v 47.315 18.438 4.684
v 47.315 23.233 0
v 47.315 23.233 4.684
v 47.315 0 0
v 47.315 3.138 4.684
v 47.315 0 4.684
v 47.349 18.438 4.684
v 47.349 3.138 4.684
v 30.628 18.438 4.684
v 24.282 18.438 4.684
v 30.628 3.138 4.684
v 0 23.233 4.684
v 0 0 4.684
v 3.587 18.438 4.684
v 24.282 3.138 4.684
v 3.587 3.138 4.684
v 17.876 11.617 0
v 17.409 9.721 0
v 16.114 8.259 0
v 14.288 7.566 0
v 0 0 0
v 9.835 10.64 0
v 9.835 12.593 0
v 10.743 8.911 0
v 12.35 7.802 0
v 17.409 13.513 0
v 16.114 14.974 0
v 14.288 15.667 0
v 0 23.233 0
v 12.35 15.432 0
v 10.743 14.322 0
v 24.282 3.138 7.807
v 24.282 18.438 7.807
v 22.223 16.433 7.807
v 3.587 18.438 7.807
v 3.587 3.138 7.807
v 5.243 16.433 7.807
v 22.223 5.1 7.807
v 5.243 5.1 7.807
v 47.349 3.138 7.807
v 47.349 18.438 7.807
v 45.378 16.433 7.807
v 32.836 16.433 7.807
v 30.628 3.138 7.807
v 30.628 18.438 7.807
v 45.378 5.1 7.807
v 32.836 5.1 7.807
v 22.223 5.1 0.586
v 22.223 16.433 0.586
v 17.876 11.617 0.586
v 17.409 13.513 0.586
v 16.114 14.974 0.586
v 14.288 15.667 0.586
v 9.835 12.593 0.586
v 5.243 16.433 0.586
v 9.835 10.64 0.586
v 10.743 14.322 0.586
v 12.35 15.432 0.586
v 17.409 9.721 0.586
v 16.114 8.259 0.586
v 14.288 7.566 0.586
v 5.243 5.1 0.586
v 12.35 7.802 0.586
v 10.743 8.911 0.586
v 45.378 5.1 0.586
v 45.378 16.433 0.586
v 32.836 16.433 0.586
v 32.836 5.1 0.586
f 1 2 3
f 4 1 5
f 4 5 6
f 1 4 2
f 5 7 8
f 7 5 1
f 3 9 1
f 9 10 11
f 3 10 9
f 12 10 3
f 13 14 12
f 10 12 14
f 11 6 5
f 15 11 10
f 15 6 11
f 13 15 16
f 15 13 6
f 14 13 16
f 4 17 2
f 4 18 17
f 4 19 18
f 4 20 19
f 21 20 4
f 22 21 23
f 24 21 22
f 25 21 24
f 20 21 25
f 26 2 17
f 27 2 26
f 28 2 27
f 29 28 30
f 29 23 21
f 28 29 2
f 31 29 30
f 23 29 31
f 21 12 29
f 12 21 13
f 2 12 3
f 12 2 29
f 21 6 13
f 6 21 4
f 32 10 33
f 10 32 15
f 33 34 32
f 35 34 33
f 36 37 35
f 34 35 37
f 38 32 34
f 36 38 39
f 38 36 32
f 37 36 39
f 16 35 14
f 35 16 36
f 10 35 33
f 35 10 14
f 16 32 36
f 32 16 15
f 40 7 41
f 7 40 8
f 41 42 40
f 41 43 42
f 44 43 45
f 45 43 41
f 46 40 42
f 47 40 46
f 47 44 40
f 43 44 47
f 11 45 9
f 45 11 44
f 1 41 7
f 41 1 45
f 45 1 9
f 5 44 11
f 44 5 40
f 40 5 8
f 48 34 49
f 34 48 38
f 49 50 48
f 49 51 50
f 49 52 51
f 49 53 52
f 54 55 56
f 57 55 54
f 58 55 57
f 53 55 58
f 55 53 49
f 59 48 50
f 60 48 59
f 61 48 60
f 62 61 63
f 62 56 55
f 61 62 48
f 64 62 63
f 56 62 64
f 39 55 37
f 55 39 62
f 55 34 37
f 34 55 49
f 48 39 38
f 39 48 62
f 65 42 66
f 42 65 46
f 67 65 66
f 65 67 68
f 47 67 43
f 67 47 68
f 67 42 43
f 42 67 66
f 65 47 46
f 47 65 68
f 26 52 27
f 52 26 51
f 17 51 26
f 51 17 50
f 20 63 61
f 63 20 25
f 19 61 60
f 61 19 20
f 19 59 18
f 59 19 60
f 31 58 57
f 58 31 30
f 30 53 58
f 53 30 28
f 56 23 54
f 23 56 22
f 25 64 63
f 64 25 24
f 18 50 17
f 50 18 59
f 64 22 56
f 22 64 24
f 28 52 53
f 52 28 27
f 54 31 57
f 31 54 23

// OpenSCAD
coldiameter = 17;
mod = coldiameter;
cpo = mod/10; // capitol offset
ch = mod*5* 1.24;
colid = 10.25;  			   		 //inner (open) diameter of column
colih = mod/3;				  	 // height of boss for column
//length = ch * .618;  			// for golden rectangle
n_o_c = 6;										//number of columns across front of temple
length = ((ch*1.618)*1.618)/(n_o_c-1); 	//comment either this or the other def out before compiiing
echo ("Length",length);									//if used, front of temple is golden rectangle
height = ch/15;
width = (mod + (cpo*2))* 1.0;  		//allows over or under hang if desired
angle = 1;

echo("Width=",width);

f_overhang = 2;			  //frieze overhang
f_height = height*2;		  //frieze height
f_d = .03; 					// amount of triglyph inset

c_overhang = mod/6;			  //cornice overhang
c_height = height *2/3;		  //cornice height
c_length = length;


//beam();
//corner();

//frieze_beam(2); 		  // parmeter is number of trigliphs
//frieze_corner();

//rotate([180,0,0]) translate([0,-18,-f_height-c_height]) {cornice_beam();}

cornice_beam(2);			//parameter is type, short or long
//cornice_beam(0);
//cornice_corner();

//qr(20,-1);					//makes a quarter round beam, if second parameter is 1, rounds one end, -1 other end
//tri();
//peg();

//abacus();
//multi_abacus();


module cornice_corner() {

}

module cornice_beam(type) {
	difference() {
		union() {
			if ( type == 0 ) {
				cube([length,width+c_overhang,c_height]);										//full sized
				translate([length*.065,width/6.5,c_height])										//full inset
					cube([length/2-(length*.125),width-(width*.25),c_height/1.5]);
				}
			if ( type == 1 ) {
				cube([length+mod/4+c_overhang,width+c_overhang,c_height]);				//for long corner
				translate([length*.065,width/6.5+c_overhang/2,c_height])						//full inset
					cube([length/2-(length*.125),width-(width*.25),c_height/1.5]);
				//echo(length+mod/4+c_overhang);	
				}	
			if ( type == 2 ) {
				cube([length-mod/2.16,width+c_overhang,c_height]);							//for short corner
				translate([length*.065,width/6.5,c_height])										//full inset
					cube([length/2-(length*.125),width-(width*.25),c_height/1.5]);
				echo("len",length-mod/2.16);	
				}	

				if (type == 0 ) {
				translate([length/2 + (length*.065),width/6.5,c_height])							//full inset
					cube([length/2-(length*.125),width-(width*.25),c_height/1.5]);
				}
				if (type == 1 ){
				translate([length/2 + (length*.055),width/6.5+c_overhang/2,c_height])		//long inset middle
					cube([length/2-(length*.354),width-(width*.25),c_height/1.5]);
				translate([length-mod/1.35,width/6.5+c_overhang/2,c_height])				//long inset end
					cube([length/4,width-(width*.25),c_height/1.5]);
				}
				if (type == 2 ){
				translate([length/2 + (length*.055),width/6.5,c_height])		//short inset middle
					cube([length/2-(length*.197),width-(width*.25),c_height/1.5]);
				}
			}
	
	translate([length/4,width/2+c_overhang/2,0]) cylinder(h=c_height,r=width/5);
	
	if (type == 0 ) {
		translate([(length*.095),width/4,c_height/8]) cube([length/3.25,width/1.8,c_height*2]);
		translate([length/2+(length*.095),width/4,c_height/8]) cube([length/3.25,width/1.8,c_height*2]);
		translate([length*.75,width/2+c_overhang/2,0]) cylinder(h=c_height,r=width/5);
		}
	if (type == 1 ) {
		translate([(length*.095),width/4+c_overhang/2,c_height/8]) cube([length/3.25,width/1.8,c_height*2]);
		translate([length/2+(length*.095),width/4+c_overhang/2,c_height/8]) cube([length/14,width/1.8,c_height*2]);
		translate([length-mod/1.65,width/4+c_overhang/2,c_height/8])									//long inset end
			cube([length/6,width/1.8,c_height*2]);
		//echo((length+mod/4+c_overhang));
		//echo(length-mod/1.75);
		//echo(length/6);
		//echo((length+mod/4+c_overhang)-(length-mod/1.75)-(length/6));
		//translate([length*.75,width/2+c_overhang/2,0]) cylinder(h=c_height,r=width/5);
		}
	if (type == 2 ) {
		translate([(length*.095),width/4,c_height/8]) 
			cube([length/3.25,width/1.8,c_height*2]);												//full inset
		translate([length/2+(length*.095),width/4,c_height/8]) 
			cube([length/4.4,width/1.8,c_height*2]);													//short inset end
		}
	}
}


module frieze_corner() {
	union() {	
		difference() {
			cube([length/2+mod/4,width,f_height]);							//first, shorter, leg of basic solid
			translate([length/25,width/10,height/10])
			cube([length/2+mod/4-length/12,width-width/5,f_height]);		//hollow
			translate([width/2,width/2,0])
			cylinder(h = height/2, r = width/4, $fs = angle);					//peg hole
			}
		//translate([width-length/20,0,0])  cube([length/25,width,f_height]);
		translate([0,0,0]) rotate([0,90,0]) {
			qr(length/2+mod/4,0);													//bottom quarter round
			}
		translate([0,-f_height/15,f_height*.7]) cube([length/2+mod/4,f_height/15,f_height/6]);	//top rect. bar
		translate([0,0,f_height]) rotate([90.001,0,90])  {
			qr(length/2+mod/4,0);									//top quarter round
			}
		translate([mod/4,-f_height/10,0])										//triglyph, only one on this side
			tri();
		//translate([(length/4)*2+(length/10),-f_height/15,0])
		//	tri();
		}																						//closes first part union
	union() {
		difference() {
		cube([width,(length/2)+(mod*.75),f_height]);									//longer leg of basic solid
		translate([width/10,length/30,height/10])
			cube([width-width/5,(length/2)+(mod*.75)-length/15,f_height]);		//hollow
		translate([width/2,width/2,0])
			cylinder(h = height/2, r = width/4, $fs = angle);							//peg hole in same location 
			//	translate([width/2,3*length/4,0])
			//		cylinder(h = height/2, r = width/8, $fs = angle);	
			}
		//translate([0,width-length/20,0])  cube([length/20,width,f_height]);
		translate([0,length/1.37,0]) rotate([90,90,0]) {
			qr(((length/2)+mod*.75),1);													//bottom quarter round
			}
		translate([0,0,f_height]) rotate([180.001,270,90])  {							//note fudge factor for manifold
			qr(((length/2)+mod*.75),-1);													//top quarter round
			}
		translate([-f_height/15,-f_height/12,f_height*.7]) 
			cube([f_height/15,length/2+coldiameter*.75+f_height/12,f_height/6]);
		translate([-f_height/10,mod*.76,0]) rotate([0,0,270.001])					//triglyph near corner
			tri();
		translate([-f_height/10,length-(mod*.875),0]) rotate([0,0,270.001])		//triglyph away from corner
			tri();
		}																						//closes second part union
}


module frieze_beam(number) {
union() {
	difference() {
	cube([length,width,f_height]);												//basic solid
	translate([length/20,width/10,height/10])
		cube([length-length/10,width-width/5,f_height]);						//hollow
	translate([length/4+mod/4,width/2,0])
			cylinder(h = height/2, r = width/4, $fs = angle);					//peg hole
	translate([(3*length/4)+mod/4,width/2,0])
			cylinder(h = height/2, r = width/4, $fs = angle);					//peg hole
	}
	translate([length/2-length/20,0,0])  cube([length/10,width,f_height]);  //center beam

	rotate([0,90,0]) qr(length,0);													 //bottom quarter round
	translate([0,0,f_height]) rotate([90.001,0,90]) qr(length,0);				 //top quarter round, note fudge for manifold

	translate([0,-f_height/12,f_height*.7]) cube([length,f_height/12,f_height/6]);
	if ( number == 3 ) {
		translate([0,-f_height/15,0])
			tri();
		translate([(length/5)*2,-f_height/15,0])
			tri();
		translate([(length/5)*4,-f_height/15,0])
			tri();
		}
	else if ( number == 2 ){
		translate([(length/4)*0,-f_height/10,0])
			tri();
		translate([(length/4)*2,-f_height/10,0])
			tri();
	}
	else if ( number == 1 ){
		translate([(length/4)*0,-f_height/10,0])
			tri();
	}
}
}


module qr(len,corner) {

	difference() {
		union() {
			cylinder(h = len, r = f_height/6, $fs = angle);
			if (corner == 1) translate([0,0,len]) sphere(f_height/6, $fs = angle);
			if (corner == -1) sphere(f_height/6, $fs = angle);
			}		
		translate([-f_height/3,0,-f_height/3])
			cube([f_height/2.5,f_height/4,len*1.5]);
		translate([0,-f_height/4,-f_height/3])
			cube([f_height/4,f_height/2,len*1.5]);
		}
}

module tri() {
	difference() {

		translate([0,0,f_height/7])
			cube([mod/2,f_height/10,f_height-f_height/3]);					//basic plate shape
		translate([0,-f_height*f_d,0])
			scale([1,1.5,1]) cylinder(r = mod*.05, h = f_height-f_height/6, $fs = .05);	//left half groove
		translate([mod*.167,-f_height*f_d,0])
			scale([1,1.5,1]) cylinder(r = mod*.05, h = f_height-f_height/6, $fs = .05);	//left full groove
		translate([mod*.333,-f_height*f_d,0])
			scale([1,1.5,1]) cylinder(r = mod*.05, h = f_height-f_height/6, $fs = .05);	//right full groove
		translate([mod/2,-f_height*f_d,0])
			scale([1,1.5,1]) cylinder(r = mod*.05, h = f_height-f_height/6, $fs = .05);	//right half groove
		}
	translate([0,-f_height/20,f_height*.7])
		cube([mod/2,f_height/7,f_height/7]);
}

module beam() {
	difference() {
		cube([length, width, height]);								//basic solid
		translate([length/4,width/2,0])
			cylinder(h = height/2, r = width/4, $fs = angle);	//inset for frieze peg
		translate([3*length/4,width/2,0])
			cylinder(h = height/2, r = width/4, $fs = angle);	//inset for frieze peg
		}
	difference() {
		translate([0,width/2,0])
			cylinder(h = (height + colih), r1 = colid/2, r2 = colid/2.25, $fs = angle);
		translate([-colid/2,0,0])
			cube([colid/2,width,height*2]);					//make half cylinder
		}
	difference() {
		translate([length,width/2,0])
			cylinder(h = (height + colih), r1 = colid/2, r2 = colid/2.25, $fs = angle);
		translate([length,0,0])
			cube([colid/2,width,height*2]);					//make half cylinder
		}
}

module corner() {
	difference() {
		cube([length+width/2, width, height]);				//basic solid 
		translate([width/2,width/2,0])
			cylinder(h = height/2, r = width/4, $fs = angle);	//inset for frieze peg
		translate([(3*length/4)+width/2,width/2,0])
			cylinder(h = height/2, r = width/4, $fs = angle);	//inset for frieze peg	
			//echo("d=",(length+width/2)-((3*length/4)+width/2));
		}
	difference() {
		translate([0,width,0])
			cube([width, length-width/2, height]);											//makes l-shaped solid 
		translate([width/2,(3*length/4)+width/2,0])
			cylinder(h = height/2, r1 = colid/2, r2 = colid/2.25, $fs = angle);			//inset for frieze peg	
		}
	translate([width/2,width/2,height/2])
		cylinder(h = (height/2 + colih), r = colid/2, r2 = colid/2.25, $fs = angle);		//center column peg
	difference() {
		translate([length+width/2,width/2,0])
			cylinder(h = (height + colih), r1 = colid/2, r2 = colid/2.25, $fs = angle); //half column peg
		translate([length+width/2,0,0])
			cube([colid/2,width,height*2]);
		}
	difference() {
		translate([width/2,length+width/2,0])
			cylinder(h = (height + colih), r1 = colid/2, r2 = colid/2.25,  $fs = angle); //half column peg
		translate([0,length+width/2,0])
			cube([width,colid/2,height*2]);
		}
}

module peg() {
	echo("r1=",width/4.55);
	translate([0,0,height/10]) cylinder(h = height*.6, r1= width/4.55, r2 = width/4.76, $fs = angle);
	translate([width/15,0,0]) cube([width/1.5,width/2,height/5], center= true);
}

module abacus() {
	translate([(width*1.1)/2,(width*1.1)/2,height/2])
		cylinder(h = height/2, r = colid/2, $fs = angle);
	difference() {
		cube([width*1.1,width*1.1,height/2]);
		translate([(width*1.1)/2,(width*1.1)/2,0])
			cylinder(h = (height/2)-.65, r =colid/1.75, $fs = angle);
		}
}

module multi_abacus() {
abacus();
translate([width*1.5,0,0])
	abacus();
translate([0,width*1.5,0])
	abacus();
translate([width*1.5,width*1.5,0])
	abacus();
}
